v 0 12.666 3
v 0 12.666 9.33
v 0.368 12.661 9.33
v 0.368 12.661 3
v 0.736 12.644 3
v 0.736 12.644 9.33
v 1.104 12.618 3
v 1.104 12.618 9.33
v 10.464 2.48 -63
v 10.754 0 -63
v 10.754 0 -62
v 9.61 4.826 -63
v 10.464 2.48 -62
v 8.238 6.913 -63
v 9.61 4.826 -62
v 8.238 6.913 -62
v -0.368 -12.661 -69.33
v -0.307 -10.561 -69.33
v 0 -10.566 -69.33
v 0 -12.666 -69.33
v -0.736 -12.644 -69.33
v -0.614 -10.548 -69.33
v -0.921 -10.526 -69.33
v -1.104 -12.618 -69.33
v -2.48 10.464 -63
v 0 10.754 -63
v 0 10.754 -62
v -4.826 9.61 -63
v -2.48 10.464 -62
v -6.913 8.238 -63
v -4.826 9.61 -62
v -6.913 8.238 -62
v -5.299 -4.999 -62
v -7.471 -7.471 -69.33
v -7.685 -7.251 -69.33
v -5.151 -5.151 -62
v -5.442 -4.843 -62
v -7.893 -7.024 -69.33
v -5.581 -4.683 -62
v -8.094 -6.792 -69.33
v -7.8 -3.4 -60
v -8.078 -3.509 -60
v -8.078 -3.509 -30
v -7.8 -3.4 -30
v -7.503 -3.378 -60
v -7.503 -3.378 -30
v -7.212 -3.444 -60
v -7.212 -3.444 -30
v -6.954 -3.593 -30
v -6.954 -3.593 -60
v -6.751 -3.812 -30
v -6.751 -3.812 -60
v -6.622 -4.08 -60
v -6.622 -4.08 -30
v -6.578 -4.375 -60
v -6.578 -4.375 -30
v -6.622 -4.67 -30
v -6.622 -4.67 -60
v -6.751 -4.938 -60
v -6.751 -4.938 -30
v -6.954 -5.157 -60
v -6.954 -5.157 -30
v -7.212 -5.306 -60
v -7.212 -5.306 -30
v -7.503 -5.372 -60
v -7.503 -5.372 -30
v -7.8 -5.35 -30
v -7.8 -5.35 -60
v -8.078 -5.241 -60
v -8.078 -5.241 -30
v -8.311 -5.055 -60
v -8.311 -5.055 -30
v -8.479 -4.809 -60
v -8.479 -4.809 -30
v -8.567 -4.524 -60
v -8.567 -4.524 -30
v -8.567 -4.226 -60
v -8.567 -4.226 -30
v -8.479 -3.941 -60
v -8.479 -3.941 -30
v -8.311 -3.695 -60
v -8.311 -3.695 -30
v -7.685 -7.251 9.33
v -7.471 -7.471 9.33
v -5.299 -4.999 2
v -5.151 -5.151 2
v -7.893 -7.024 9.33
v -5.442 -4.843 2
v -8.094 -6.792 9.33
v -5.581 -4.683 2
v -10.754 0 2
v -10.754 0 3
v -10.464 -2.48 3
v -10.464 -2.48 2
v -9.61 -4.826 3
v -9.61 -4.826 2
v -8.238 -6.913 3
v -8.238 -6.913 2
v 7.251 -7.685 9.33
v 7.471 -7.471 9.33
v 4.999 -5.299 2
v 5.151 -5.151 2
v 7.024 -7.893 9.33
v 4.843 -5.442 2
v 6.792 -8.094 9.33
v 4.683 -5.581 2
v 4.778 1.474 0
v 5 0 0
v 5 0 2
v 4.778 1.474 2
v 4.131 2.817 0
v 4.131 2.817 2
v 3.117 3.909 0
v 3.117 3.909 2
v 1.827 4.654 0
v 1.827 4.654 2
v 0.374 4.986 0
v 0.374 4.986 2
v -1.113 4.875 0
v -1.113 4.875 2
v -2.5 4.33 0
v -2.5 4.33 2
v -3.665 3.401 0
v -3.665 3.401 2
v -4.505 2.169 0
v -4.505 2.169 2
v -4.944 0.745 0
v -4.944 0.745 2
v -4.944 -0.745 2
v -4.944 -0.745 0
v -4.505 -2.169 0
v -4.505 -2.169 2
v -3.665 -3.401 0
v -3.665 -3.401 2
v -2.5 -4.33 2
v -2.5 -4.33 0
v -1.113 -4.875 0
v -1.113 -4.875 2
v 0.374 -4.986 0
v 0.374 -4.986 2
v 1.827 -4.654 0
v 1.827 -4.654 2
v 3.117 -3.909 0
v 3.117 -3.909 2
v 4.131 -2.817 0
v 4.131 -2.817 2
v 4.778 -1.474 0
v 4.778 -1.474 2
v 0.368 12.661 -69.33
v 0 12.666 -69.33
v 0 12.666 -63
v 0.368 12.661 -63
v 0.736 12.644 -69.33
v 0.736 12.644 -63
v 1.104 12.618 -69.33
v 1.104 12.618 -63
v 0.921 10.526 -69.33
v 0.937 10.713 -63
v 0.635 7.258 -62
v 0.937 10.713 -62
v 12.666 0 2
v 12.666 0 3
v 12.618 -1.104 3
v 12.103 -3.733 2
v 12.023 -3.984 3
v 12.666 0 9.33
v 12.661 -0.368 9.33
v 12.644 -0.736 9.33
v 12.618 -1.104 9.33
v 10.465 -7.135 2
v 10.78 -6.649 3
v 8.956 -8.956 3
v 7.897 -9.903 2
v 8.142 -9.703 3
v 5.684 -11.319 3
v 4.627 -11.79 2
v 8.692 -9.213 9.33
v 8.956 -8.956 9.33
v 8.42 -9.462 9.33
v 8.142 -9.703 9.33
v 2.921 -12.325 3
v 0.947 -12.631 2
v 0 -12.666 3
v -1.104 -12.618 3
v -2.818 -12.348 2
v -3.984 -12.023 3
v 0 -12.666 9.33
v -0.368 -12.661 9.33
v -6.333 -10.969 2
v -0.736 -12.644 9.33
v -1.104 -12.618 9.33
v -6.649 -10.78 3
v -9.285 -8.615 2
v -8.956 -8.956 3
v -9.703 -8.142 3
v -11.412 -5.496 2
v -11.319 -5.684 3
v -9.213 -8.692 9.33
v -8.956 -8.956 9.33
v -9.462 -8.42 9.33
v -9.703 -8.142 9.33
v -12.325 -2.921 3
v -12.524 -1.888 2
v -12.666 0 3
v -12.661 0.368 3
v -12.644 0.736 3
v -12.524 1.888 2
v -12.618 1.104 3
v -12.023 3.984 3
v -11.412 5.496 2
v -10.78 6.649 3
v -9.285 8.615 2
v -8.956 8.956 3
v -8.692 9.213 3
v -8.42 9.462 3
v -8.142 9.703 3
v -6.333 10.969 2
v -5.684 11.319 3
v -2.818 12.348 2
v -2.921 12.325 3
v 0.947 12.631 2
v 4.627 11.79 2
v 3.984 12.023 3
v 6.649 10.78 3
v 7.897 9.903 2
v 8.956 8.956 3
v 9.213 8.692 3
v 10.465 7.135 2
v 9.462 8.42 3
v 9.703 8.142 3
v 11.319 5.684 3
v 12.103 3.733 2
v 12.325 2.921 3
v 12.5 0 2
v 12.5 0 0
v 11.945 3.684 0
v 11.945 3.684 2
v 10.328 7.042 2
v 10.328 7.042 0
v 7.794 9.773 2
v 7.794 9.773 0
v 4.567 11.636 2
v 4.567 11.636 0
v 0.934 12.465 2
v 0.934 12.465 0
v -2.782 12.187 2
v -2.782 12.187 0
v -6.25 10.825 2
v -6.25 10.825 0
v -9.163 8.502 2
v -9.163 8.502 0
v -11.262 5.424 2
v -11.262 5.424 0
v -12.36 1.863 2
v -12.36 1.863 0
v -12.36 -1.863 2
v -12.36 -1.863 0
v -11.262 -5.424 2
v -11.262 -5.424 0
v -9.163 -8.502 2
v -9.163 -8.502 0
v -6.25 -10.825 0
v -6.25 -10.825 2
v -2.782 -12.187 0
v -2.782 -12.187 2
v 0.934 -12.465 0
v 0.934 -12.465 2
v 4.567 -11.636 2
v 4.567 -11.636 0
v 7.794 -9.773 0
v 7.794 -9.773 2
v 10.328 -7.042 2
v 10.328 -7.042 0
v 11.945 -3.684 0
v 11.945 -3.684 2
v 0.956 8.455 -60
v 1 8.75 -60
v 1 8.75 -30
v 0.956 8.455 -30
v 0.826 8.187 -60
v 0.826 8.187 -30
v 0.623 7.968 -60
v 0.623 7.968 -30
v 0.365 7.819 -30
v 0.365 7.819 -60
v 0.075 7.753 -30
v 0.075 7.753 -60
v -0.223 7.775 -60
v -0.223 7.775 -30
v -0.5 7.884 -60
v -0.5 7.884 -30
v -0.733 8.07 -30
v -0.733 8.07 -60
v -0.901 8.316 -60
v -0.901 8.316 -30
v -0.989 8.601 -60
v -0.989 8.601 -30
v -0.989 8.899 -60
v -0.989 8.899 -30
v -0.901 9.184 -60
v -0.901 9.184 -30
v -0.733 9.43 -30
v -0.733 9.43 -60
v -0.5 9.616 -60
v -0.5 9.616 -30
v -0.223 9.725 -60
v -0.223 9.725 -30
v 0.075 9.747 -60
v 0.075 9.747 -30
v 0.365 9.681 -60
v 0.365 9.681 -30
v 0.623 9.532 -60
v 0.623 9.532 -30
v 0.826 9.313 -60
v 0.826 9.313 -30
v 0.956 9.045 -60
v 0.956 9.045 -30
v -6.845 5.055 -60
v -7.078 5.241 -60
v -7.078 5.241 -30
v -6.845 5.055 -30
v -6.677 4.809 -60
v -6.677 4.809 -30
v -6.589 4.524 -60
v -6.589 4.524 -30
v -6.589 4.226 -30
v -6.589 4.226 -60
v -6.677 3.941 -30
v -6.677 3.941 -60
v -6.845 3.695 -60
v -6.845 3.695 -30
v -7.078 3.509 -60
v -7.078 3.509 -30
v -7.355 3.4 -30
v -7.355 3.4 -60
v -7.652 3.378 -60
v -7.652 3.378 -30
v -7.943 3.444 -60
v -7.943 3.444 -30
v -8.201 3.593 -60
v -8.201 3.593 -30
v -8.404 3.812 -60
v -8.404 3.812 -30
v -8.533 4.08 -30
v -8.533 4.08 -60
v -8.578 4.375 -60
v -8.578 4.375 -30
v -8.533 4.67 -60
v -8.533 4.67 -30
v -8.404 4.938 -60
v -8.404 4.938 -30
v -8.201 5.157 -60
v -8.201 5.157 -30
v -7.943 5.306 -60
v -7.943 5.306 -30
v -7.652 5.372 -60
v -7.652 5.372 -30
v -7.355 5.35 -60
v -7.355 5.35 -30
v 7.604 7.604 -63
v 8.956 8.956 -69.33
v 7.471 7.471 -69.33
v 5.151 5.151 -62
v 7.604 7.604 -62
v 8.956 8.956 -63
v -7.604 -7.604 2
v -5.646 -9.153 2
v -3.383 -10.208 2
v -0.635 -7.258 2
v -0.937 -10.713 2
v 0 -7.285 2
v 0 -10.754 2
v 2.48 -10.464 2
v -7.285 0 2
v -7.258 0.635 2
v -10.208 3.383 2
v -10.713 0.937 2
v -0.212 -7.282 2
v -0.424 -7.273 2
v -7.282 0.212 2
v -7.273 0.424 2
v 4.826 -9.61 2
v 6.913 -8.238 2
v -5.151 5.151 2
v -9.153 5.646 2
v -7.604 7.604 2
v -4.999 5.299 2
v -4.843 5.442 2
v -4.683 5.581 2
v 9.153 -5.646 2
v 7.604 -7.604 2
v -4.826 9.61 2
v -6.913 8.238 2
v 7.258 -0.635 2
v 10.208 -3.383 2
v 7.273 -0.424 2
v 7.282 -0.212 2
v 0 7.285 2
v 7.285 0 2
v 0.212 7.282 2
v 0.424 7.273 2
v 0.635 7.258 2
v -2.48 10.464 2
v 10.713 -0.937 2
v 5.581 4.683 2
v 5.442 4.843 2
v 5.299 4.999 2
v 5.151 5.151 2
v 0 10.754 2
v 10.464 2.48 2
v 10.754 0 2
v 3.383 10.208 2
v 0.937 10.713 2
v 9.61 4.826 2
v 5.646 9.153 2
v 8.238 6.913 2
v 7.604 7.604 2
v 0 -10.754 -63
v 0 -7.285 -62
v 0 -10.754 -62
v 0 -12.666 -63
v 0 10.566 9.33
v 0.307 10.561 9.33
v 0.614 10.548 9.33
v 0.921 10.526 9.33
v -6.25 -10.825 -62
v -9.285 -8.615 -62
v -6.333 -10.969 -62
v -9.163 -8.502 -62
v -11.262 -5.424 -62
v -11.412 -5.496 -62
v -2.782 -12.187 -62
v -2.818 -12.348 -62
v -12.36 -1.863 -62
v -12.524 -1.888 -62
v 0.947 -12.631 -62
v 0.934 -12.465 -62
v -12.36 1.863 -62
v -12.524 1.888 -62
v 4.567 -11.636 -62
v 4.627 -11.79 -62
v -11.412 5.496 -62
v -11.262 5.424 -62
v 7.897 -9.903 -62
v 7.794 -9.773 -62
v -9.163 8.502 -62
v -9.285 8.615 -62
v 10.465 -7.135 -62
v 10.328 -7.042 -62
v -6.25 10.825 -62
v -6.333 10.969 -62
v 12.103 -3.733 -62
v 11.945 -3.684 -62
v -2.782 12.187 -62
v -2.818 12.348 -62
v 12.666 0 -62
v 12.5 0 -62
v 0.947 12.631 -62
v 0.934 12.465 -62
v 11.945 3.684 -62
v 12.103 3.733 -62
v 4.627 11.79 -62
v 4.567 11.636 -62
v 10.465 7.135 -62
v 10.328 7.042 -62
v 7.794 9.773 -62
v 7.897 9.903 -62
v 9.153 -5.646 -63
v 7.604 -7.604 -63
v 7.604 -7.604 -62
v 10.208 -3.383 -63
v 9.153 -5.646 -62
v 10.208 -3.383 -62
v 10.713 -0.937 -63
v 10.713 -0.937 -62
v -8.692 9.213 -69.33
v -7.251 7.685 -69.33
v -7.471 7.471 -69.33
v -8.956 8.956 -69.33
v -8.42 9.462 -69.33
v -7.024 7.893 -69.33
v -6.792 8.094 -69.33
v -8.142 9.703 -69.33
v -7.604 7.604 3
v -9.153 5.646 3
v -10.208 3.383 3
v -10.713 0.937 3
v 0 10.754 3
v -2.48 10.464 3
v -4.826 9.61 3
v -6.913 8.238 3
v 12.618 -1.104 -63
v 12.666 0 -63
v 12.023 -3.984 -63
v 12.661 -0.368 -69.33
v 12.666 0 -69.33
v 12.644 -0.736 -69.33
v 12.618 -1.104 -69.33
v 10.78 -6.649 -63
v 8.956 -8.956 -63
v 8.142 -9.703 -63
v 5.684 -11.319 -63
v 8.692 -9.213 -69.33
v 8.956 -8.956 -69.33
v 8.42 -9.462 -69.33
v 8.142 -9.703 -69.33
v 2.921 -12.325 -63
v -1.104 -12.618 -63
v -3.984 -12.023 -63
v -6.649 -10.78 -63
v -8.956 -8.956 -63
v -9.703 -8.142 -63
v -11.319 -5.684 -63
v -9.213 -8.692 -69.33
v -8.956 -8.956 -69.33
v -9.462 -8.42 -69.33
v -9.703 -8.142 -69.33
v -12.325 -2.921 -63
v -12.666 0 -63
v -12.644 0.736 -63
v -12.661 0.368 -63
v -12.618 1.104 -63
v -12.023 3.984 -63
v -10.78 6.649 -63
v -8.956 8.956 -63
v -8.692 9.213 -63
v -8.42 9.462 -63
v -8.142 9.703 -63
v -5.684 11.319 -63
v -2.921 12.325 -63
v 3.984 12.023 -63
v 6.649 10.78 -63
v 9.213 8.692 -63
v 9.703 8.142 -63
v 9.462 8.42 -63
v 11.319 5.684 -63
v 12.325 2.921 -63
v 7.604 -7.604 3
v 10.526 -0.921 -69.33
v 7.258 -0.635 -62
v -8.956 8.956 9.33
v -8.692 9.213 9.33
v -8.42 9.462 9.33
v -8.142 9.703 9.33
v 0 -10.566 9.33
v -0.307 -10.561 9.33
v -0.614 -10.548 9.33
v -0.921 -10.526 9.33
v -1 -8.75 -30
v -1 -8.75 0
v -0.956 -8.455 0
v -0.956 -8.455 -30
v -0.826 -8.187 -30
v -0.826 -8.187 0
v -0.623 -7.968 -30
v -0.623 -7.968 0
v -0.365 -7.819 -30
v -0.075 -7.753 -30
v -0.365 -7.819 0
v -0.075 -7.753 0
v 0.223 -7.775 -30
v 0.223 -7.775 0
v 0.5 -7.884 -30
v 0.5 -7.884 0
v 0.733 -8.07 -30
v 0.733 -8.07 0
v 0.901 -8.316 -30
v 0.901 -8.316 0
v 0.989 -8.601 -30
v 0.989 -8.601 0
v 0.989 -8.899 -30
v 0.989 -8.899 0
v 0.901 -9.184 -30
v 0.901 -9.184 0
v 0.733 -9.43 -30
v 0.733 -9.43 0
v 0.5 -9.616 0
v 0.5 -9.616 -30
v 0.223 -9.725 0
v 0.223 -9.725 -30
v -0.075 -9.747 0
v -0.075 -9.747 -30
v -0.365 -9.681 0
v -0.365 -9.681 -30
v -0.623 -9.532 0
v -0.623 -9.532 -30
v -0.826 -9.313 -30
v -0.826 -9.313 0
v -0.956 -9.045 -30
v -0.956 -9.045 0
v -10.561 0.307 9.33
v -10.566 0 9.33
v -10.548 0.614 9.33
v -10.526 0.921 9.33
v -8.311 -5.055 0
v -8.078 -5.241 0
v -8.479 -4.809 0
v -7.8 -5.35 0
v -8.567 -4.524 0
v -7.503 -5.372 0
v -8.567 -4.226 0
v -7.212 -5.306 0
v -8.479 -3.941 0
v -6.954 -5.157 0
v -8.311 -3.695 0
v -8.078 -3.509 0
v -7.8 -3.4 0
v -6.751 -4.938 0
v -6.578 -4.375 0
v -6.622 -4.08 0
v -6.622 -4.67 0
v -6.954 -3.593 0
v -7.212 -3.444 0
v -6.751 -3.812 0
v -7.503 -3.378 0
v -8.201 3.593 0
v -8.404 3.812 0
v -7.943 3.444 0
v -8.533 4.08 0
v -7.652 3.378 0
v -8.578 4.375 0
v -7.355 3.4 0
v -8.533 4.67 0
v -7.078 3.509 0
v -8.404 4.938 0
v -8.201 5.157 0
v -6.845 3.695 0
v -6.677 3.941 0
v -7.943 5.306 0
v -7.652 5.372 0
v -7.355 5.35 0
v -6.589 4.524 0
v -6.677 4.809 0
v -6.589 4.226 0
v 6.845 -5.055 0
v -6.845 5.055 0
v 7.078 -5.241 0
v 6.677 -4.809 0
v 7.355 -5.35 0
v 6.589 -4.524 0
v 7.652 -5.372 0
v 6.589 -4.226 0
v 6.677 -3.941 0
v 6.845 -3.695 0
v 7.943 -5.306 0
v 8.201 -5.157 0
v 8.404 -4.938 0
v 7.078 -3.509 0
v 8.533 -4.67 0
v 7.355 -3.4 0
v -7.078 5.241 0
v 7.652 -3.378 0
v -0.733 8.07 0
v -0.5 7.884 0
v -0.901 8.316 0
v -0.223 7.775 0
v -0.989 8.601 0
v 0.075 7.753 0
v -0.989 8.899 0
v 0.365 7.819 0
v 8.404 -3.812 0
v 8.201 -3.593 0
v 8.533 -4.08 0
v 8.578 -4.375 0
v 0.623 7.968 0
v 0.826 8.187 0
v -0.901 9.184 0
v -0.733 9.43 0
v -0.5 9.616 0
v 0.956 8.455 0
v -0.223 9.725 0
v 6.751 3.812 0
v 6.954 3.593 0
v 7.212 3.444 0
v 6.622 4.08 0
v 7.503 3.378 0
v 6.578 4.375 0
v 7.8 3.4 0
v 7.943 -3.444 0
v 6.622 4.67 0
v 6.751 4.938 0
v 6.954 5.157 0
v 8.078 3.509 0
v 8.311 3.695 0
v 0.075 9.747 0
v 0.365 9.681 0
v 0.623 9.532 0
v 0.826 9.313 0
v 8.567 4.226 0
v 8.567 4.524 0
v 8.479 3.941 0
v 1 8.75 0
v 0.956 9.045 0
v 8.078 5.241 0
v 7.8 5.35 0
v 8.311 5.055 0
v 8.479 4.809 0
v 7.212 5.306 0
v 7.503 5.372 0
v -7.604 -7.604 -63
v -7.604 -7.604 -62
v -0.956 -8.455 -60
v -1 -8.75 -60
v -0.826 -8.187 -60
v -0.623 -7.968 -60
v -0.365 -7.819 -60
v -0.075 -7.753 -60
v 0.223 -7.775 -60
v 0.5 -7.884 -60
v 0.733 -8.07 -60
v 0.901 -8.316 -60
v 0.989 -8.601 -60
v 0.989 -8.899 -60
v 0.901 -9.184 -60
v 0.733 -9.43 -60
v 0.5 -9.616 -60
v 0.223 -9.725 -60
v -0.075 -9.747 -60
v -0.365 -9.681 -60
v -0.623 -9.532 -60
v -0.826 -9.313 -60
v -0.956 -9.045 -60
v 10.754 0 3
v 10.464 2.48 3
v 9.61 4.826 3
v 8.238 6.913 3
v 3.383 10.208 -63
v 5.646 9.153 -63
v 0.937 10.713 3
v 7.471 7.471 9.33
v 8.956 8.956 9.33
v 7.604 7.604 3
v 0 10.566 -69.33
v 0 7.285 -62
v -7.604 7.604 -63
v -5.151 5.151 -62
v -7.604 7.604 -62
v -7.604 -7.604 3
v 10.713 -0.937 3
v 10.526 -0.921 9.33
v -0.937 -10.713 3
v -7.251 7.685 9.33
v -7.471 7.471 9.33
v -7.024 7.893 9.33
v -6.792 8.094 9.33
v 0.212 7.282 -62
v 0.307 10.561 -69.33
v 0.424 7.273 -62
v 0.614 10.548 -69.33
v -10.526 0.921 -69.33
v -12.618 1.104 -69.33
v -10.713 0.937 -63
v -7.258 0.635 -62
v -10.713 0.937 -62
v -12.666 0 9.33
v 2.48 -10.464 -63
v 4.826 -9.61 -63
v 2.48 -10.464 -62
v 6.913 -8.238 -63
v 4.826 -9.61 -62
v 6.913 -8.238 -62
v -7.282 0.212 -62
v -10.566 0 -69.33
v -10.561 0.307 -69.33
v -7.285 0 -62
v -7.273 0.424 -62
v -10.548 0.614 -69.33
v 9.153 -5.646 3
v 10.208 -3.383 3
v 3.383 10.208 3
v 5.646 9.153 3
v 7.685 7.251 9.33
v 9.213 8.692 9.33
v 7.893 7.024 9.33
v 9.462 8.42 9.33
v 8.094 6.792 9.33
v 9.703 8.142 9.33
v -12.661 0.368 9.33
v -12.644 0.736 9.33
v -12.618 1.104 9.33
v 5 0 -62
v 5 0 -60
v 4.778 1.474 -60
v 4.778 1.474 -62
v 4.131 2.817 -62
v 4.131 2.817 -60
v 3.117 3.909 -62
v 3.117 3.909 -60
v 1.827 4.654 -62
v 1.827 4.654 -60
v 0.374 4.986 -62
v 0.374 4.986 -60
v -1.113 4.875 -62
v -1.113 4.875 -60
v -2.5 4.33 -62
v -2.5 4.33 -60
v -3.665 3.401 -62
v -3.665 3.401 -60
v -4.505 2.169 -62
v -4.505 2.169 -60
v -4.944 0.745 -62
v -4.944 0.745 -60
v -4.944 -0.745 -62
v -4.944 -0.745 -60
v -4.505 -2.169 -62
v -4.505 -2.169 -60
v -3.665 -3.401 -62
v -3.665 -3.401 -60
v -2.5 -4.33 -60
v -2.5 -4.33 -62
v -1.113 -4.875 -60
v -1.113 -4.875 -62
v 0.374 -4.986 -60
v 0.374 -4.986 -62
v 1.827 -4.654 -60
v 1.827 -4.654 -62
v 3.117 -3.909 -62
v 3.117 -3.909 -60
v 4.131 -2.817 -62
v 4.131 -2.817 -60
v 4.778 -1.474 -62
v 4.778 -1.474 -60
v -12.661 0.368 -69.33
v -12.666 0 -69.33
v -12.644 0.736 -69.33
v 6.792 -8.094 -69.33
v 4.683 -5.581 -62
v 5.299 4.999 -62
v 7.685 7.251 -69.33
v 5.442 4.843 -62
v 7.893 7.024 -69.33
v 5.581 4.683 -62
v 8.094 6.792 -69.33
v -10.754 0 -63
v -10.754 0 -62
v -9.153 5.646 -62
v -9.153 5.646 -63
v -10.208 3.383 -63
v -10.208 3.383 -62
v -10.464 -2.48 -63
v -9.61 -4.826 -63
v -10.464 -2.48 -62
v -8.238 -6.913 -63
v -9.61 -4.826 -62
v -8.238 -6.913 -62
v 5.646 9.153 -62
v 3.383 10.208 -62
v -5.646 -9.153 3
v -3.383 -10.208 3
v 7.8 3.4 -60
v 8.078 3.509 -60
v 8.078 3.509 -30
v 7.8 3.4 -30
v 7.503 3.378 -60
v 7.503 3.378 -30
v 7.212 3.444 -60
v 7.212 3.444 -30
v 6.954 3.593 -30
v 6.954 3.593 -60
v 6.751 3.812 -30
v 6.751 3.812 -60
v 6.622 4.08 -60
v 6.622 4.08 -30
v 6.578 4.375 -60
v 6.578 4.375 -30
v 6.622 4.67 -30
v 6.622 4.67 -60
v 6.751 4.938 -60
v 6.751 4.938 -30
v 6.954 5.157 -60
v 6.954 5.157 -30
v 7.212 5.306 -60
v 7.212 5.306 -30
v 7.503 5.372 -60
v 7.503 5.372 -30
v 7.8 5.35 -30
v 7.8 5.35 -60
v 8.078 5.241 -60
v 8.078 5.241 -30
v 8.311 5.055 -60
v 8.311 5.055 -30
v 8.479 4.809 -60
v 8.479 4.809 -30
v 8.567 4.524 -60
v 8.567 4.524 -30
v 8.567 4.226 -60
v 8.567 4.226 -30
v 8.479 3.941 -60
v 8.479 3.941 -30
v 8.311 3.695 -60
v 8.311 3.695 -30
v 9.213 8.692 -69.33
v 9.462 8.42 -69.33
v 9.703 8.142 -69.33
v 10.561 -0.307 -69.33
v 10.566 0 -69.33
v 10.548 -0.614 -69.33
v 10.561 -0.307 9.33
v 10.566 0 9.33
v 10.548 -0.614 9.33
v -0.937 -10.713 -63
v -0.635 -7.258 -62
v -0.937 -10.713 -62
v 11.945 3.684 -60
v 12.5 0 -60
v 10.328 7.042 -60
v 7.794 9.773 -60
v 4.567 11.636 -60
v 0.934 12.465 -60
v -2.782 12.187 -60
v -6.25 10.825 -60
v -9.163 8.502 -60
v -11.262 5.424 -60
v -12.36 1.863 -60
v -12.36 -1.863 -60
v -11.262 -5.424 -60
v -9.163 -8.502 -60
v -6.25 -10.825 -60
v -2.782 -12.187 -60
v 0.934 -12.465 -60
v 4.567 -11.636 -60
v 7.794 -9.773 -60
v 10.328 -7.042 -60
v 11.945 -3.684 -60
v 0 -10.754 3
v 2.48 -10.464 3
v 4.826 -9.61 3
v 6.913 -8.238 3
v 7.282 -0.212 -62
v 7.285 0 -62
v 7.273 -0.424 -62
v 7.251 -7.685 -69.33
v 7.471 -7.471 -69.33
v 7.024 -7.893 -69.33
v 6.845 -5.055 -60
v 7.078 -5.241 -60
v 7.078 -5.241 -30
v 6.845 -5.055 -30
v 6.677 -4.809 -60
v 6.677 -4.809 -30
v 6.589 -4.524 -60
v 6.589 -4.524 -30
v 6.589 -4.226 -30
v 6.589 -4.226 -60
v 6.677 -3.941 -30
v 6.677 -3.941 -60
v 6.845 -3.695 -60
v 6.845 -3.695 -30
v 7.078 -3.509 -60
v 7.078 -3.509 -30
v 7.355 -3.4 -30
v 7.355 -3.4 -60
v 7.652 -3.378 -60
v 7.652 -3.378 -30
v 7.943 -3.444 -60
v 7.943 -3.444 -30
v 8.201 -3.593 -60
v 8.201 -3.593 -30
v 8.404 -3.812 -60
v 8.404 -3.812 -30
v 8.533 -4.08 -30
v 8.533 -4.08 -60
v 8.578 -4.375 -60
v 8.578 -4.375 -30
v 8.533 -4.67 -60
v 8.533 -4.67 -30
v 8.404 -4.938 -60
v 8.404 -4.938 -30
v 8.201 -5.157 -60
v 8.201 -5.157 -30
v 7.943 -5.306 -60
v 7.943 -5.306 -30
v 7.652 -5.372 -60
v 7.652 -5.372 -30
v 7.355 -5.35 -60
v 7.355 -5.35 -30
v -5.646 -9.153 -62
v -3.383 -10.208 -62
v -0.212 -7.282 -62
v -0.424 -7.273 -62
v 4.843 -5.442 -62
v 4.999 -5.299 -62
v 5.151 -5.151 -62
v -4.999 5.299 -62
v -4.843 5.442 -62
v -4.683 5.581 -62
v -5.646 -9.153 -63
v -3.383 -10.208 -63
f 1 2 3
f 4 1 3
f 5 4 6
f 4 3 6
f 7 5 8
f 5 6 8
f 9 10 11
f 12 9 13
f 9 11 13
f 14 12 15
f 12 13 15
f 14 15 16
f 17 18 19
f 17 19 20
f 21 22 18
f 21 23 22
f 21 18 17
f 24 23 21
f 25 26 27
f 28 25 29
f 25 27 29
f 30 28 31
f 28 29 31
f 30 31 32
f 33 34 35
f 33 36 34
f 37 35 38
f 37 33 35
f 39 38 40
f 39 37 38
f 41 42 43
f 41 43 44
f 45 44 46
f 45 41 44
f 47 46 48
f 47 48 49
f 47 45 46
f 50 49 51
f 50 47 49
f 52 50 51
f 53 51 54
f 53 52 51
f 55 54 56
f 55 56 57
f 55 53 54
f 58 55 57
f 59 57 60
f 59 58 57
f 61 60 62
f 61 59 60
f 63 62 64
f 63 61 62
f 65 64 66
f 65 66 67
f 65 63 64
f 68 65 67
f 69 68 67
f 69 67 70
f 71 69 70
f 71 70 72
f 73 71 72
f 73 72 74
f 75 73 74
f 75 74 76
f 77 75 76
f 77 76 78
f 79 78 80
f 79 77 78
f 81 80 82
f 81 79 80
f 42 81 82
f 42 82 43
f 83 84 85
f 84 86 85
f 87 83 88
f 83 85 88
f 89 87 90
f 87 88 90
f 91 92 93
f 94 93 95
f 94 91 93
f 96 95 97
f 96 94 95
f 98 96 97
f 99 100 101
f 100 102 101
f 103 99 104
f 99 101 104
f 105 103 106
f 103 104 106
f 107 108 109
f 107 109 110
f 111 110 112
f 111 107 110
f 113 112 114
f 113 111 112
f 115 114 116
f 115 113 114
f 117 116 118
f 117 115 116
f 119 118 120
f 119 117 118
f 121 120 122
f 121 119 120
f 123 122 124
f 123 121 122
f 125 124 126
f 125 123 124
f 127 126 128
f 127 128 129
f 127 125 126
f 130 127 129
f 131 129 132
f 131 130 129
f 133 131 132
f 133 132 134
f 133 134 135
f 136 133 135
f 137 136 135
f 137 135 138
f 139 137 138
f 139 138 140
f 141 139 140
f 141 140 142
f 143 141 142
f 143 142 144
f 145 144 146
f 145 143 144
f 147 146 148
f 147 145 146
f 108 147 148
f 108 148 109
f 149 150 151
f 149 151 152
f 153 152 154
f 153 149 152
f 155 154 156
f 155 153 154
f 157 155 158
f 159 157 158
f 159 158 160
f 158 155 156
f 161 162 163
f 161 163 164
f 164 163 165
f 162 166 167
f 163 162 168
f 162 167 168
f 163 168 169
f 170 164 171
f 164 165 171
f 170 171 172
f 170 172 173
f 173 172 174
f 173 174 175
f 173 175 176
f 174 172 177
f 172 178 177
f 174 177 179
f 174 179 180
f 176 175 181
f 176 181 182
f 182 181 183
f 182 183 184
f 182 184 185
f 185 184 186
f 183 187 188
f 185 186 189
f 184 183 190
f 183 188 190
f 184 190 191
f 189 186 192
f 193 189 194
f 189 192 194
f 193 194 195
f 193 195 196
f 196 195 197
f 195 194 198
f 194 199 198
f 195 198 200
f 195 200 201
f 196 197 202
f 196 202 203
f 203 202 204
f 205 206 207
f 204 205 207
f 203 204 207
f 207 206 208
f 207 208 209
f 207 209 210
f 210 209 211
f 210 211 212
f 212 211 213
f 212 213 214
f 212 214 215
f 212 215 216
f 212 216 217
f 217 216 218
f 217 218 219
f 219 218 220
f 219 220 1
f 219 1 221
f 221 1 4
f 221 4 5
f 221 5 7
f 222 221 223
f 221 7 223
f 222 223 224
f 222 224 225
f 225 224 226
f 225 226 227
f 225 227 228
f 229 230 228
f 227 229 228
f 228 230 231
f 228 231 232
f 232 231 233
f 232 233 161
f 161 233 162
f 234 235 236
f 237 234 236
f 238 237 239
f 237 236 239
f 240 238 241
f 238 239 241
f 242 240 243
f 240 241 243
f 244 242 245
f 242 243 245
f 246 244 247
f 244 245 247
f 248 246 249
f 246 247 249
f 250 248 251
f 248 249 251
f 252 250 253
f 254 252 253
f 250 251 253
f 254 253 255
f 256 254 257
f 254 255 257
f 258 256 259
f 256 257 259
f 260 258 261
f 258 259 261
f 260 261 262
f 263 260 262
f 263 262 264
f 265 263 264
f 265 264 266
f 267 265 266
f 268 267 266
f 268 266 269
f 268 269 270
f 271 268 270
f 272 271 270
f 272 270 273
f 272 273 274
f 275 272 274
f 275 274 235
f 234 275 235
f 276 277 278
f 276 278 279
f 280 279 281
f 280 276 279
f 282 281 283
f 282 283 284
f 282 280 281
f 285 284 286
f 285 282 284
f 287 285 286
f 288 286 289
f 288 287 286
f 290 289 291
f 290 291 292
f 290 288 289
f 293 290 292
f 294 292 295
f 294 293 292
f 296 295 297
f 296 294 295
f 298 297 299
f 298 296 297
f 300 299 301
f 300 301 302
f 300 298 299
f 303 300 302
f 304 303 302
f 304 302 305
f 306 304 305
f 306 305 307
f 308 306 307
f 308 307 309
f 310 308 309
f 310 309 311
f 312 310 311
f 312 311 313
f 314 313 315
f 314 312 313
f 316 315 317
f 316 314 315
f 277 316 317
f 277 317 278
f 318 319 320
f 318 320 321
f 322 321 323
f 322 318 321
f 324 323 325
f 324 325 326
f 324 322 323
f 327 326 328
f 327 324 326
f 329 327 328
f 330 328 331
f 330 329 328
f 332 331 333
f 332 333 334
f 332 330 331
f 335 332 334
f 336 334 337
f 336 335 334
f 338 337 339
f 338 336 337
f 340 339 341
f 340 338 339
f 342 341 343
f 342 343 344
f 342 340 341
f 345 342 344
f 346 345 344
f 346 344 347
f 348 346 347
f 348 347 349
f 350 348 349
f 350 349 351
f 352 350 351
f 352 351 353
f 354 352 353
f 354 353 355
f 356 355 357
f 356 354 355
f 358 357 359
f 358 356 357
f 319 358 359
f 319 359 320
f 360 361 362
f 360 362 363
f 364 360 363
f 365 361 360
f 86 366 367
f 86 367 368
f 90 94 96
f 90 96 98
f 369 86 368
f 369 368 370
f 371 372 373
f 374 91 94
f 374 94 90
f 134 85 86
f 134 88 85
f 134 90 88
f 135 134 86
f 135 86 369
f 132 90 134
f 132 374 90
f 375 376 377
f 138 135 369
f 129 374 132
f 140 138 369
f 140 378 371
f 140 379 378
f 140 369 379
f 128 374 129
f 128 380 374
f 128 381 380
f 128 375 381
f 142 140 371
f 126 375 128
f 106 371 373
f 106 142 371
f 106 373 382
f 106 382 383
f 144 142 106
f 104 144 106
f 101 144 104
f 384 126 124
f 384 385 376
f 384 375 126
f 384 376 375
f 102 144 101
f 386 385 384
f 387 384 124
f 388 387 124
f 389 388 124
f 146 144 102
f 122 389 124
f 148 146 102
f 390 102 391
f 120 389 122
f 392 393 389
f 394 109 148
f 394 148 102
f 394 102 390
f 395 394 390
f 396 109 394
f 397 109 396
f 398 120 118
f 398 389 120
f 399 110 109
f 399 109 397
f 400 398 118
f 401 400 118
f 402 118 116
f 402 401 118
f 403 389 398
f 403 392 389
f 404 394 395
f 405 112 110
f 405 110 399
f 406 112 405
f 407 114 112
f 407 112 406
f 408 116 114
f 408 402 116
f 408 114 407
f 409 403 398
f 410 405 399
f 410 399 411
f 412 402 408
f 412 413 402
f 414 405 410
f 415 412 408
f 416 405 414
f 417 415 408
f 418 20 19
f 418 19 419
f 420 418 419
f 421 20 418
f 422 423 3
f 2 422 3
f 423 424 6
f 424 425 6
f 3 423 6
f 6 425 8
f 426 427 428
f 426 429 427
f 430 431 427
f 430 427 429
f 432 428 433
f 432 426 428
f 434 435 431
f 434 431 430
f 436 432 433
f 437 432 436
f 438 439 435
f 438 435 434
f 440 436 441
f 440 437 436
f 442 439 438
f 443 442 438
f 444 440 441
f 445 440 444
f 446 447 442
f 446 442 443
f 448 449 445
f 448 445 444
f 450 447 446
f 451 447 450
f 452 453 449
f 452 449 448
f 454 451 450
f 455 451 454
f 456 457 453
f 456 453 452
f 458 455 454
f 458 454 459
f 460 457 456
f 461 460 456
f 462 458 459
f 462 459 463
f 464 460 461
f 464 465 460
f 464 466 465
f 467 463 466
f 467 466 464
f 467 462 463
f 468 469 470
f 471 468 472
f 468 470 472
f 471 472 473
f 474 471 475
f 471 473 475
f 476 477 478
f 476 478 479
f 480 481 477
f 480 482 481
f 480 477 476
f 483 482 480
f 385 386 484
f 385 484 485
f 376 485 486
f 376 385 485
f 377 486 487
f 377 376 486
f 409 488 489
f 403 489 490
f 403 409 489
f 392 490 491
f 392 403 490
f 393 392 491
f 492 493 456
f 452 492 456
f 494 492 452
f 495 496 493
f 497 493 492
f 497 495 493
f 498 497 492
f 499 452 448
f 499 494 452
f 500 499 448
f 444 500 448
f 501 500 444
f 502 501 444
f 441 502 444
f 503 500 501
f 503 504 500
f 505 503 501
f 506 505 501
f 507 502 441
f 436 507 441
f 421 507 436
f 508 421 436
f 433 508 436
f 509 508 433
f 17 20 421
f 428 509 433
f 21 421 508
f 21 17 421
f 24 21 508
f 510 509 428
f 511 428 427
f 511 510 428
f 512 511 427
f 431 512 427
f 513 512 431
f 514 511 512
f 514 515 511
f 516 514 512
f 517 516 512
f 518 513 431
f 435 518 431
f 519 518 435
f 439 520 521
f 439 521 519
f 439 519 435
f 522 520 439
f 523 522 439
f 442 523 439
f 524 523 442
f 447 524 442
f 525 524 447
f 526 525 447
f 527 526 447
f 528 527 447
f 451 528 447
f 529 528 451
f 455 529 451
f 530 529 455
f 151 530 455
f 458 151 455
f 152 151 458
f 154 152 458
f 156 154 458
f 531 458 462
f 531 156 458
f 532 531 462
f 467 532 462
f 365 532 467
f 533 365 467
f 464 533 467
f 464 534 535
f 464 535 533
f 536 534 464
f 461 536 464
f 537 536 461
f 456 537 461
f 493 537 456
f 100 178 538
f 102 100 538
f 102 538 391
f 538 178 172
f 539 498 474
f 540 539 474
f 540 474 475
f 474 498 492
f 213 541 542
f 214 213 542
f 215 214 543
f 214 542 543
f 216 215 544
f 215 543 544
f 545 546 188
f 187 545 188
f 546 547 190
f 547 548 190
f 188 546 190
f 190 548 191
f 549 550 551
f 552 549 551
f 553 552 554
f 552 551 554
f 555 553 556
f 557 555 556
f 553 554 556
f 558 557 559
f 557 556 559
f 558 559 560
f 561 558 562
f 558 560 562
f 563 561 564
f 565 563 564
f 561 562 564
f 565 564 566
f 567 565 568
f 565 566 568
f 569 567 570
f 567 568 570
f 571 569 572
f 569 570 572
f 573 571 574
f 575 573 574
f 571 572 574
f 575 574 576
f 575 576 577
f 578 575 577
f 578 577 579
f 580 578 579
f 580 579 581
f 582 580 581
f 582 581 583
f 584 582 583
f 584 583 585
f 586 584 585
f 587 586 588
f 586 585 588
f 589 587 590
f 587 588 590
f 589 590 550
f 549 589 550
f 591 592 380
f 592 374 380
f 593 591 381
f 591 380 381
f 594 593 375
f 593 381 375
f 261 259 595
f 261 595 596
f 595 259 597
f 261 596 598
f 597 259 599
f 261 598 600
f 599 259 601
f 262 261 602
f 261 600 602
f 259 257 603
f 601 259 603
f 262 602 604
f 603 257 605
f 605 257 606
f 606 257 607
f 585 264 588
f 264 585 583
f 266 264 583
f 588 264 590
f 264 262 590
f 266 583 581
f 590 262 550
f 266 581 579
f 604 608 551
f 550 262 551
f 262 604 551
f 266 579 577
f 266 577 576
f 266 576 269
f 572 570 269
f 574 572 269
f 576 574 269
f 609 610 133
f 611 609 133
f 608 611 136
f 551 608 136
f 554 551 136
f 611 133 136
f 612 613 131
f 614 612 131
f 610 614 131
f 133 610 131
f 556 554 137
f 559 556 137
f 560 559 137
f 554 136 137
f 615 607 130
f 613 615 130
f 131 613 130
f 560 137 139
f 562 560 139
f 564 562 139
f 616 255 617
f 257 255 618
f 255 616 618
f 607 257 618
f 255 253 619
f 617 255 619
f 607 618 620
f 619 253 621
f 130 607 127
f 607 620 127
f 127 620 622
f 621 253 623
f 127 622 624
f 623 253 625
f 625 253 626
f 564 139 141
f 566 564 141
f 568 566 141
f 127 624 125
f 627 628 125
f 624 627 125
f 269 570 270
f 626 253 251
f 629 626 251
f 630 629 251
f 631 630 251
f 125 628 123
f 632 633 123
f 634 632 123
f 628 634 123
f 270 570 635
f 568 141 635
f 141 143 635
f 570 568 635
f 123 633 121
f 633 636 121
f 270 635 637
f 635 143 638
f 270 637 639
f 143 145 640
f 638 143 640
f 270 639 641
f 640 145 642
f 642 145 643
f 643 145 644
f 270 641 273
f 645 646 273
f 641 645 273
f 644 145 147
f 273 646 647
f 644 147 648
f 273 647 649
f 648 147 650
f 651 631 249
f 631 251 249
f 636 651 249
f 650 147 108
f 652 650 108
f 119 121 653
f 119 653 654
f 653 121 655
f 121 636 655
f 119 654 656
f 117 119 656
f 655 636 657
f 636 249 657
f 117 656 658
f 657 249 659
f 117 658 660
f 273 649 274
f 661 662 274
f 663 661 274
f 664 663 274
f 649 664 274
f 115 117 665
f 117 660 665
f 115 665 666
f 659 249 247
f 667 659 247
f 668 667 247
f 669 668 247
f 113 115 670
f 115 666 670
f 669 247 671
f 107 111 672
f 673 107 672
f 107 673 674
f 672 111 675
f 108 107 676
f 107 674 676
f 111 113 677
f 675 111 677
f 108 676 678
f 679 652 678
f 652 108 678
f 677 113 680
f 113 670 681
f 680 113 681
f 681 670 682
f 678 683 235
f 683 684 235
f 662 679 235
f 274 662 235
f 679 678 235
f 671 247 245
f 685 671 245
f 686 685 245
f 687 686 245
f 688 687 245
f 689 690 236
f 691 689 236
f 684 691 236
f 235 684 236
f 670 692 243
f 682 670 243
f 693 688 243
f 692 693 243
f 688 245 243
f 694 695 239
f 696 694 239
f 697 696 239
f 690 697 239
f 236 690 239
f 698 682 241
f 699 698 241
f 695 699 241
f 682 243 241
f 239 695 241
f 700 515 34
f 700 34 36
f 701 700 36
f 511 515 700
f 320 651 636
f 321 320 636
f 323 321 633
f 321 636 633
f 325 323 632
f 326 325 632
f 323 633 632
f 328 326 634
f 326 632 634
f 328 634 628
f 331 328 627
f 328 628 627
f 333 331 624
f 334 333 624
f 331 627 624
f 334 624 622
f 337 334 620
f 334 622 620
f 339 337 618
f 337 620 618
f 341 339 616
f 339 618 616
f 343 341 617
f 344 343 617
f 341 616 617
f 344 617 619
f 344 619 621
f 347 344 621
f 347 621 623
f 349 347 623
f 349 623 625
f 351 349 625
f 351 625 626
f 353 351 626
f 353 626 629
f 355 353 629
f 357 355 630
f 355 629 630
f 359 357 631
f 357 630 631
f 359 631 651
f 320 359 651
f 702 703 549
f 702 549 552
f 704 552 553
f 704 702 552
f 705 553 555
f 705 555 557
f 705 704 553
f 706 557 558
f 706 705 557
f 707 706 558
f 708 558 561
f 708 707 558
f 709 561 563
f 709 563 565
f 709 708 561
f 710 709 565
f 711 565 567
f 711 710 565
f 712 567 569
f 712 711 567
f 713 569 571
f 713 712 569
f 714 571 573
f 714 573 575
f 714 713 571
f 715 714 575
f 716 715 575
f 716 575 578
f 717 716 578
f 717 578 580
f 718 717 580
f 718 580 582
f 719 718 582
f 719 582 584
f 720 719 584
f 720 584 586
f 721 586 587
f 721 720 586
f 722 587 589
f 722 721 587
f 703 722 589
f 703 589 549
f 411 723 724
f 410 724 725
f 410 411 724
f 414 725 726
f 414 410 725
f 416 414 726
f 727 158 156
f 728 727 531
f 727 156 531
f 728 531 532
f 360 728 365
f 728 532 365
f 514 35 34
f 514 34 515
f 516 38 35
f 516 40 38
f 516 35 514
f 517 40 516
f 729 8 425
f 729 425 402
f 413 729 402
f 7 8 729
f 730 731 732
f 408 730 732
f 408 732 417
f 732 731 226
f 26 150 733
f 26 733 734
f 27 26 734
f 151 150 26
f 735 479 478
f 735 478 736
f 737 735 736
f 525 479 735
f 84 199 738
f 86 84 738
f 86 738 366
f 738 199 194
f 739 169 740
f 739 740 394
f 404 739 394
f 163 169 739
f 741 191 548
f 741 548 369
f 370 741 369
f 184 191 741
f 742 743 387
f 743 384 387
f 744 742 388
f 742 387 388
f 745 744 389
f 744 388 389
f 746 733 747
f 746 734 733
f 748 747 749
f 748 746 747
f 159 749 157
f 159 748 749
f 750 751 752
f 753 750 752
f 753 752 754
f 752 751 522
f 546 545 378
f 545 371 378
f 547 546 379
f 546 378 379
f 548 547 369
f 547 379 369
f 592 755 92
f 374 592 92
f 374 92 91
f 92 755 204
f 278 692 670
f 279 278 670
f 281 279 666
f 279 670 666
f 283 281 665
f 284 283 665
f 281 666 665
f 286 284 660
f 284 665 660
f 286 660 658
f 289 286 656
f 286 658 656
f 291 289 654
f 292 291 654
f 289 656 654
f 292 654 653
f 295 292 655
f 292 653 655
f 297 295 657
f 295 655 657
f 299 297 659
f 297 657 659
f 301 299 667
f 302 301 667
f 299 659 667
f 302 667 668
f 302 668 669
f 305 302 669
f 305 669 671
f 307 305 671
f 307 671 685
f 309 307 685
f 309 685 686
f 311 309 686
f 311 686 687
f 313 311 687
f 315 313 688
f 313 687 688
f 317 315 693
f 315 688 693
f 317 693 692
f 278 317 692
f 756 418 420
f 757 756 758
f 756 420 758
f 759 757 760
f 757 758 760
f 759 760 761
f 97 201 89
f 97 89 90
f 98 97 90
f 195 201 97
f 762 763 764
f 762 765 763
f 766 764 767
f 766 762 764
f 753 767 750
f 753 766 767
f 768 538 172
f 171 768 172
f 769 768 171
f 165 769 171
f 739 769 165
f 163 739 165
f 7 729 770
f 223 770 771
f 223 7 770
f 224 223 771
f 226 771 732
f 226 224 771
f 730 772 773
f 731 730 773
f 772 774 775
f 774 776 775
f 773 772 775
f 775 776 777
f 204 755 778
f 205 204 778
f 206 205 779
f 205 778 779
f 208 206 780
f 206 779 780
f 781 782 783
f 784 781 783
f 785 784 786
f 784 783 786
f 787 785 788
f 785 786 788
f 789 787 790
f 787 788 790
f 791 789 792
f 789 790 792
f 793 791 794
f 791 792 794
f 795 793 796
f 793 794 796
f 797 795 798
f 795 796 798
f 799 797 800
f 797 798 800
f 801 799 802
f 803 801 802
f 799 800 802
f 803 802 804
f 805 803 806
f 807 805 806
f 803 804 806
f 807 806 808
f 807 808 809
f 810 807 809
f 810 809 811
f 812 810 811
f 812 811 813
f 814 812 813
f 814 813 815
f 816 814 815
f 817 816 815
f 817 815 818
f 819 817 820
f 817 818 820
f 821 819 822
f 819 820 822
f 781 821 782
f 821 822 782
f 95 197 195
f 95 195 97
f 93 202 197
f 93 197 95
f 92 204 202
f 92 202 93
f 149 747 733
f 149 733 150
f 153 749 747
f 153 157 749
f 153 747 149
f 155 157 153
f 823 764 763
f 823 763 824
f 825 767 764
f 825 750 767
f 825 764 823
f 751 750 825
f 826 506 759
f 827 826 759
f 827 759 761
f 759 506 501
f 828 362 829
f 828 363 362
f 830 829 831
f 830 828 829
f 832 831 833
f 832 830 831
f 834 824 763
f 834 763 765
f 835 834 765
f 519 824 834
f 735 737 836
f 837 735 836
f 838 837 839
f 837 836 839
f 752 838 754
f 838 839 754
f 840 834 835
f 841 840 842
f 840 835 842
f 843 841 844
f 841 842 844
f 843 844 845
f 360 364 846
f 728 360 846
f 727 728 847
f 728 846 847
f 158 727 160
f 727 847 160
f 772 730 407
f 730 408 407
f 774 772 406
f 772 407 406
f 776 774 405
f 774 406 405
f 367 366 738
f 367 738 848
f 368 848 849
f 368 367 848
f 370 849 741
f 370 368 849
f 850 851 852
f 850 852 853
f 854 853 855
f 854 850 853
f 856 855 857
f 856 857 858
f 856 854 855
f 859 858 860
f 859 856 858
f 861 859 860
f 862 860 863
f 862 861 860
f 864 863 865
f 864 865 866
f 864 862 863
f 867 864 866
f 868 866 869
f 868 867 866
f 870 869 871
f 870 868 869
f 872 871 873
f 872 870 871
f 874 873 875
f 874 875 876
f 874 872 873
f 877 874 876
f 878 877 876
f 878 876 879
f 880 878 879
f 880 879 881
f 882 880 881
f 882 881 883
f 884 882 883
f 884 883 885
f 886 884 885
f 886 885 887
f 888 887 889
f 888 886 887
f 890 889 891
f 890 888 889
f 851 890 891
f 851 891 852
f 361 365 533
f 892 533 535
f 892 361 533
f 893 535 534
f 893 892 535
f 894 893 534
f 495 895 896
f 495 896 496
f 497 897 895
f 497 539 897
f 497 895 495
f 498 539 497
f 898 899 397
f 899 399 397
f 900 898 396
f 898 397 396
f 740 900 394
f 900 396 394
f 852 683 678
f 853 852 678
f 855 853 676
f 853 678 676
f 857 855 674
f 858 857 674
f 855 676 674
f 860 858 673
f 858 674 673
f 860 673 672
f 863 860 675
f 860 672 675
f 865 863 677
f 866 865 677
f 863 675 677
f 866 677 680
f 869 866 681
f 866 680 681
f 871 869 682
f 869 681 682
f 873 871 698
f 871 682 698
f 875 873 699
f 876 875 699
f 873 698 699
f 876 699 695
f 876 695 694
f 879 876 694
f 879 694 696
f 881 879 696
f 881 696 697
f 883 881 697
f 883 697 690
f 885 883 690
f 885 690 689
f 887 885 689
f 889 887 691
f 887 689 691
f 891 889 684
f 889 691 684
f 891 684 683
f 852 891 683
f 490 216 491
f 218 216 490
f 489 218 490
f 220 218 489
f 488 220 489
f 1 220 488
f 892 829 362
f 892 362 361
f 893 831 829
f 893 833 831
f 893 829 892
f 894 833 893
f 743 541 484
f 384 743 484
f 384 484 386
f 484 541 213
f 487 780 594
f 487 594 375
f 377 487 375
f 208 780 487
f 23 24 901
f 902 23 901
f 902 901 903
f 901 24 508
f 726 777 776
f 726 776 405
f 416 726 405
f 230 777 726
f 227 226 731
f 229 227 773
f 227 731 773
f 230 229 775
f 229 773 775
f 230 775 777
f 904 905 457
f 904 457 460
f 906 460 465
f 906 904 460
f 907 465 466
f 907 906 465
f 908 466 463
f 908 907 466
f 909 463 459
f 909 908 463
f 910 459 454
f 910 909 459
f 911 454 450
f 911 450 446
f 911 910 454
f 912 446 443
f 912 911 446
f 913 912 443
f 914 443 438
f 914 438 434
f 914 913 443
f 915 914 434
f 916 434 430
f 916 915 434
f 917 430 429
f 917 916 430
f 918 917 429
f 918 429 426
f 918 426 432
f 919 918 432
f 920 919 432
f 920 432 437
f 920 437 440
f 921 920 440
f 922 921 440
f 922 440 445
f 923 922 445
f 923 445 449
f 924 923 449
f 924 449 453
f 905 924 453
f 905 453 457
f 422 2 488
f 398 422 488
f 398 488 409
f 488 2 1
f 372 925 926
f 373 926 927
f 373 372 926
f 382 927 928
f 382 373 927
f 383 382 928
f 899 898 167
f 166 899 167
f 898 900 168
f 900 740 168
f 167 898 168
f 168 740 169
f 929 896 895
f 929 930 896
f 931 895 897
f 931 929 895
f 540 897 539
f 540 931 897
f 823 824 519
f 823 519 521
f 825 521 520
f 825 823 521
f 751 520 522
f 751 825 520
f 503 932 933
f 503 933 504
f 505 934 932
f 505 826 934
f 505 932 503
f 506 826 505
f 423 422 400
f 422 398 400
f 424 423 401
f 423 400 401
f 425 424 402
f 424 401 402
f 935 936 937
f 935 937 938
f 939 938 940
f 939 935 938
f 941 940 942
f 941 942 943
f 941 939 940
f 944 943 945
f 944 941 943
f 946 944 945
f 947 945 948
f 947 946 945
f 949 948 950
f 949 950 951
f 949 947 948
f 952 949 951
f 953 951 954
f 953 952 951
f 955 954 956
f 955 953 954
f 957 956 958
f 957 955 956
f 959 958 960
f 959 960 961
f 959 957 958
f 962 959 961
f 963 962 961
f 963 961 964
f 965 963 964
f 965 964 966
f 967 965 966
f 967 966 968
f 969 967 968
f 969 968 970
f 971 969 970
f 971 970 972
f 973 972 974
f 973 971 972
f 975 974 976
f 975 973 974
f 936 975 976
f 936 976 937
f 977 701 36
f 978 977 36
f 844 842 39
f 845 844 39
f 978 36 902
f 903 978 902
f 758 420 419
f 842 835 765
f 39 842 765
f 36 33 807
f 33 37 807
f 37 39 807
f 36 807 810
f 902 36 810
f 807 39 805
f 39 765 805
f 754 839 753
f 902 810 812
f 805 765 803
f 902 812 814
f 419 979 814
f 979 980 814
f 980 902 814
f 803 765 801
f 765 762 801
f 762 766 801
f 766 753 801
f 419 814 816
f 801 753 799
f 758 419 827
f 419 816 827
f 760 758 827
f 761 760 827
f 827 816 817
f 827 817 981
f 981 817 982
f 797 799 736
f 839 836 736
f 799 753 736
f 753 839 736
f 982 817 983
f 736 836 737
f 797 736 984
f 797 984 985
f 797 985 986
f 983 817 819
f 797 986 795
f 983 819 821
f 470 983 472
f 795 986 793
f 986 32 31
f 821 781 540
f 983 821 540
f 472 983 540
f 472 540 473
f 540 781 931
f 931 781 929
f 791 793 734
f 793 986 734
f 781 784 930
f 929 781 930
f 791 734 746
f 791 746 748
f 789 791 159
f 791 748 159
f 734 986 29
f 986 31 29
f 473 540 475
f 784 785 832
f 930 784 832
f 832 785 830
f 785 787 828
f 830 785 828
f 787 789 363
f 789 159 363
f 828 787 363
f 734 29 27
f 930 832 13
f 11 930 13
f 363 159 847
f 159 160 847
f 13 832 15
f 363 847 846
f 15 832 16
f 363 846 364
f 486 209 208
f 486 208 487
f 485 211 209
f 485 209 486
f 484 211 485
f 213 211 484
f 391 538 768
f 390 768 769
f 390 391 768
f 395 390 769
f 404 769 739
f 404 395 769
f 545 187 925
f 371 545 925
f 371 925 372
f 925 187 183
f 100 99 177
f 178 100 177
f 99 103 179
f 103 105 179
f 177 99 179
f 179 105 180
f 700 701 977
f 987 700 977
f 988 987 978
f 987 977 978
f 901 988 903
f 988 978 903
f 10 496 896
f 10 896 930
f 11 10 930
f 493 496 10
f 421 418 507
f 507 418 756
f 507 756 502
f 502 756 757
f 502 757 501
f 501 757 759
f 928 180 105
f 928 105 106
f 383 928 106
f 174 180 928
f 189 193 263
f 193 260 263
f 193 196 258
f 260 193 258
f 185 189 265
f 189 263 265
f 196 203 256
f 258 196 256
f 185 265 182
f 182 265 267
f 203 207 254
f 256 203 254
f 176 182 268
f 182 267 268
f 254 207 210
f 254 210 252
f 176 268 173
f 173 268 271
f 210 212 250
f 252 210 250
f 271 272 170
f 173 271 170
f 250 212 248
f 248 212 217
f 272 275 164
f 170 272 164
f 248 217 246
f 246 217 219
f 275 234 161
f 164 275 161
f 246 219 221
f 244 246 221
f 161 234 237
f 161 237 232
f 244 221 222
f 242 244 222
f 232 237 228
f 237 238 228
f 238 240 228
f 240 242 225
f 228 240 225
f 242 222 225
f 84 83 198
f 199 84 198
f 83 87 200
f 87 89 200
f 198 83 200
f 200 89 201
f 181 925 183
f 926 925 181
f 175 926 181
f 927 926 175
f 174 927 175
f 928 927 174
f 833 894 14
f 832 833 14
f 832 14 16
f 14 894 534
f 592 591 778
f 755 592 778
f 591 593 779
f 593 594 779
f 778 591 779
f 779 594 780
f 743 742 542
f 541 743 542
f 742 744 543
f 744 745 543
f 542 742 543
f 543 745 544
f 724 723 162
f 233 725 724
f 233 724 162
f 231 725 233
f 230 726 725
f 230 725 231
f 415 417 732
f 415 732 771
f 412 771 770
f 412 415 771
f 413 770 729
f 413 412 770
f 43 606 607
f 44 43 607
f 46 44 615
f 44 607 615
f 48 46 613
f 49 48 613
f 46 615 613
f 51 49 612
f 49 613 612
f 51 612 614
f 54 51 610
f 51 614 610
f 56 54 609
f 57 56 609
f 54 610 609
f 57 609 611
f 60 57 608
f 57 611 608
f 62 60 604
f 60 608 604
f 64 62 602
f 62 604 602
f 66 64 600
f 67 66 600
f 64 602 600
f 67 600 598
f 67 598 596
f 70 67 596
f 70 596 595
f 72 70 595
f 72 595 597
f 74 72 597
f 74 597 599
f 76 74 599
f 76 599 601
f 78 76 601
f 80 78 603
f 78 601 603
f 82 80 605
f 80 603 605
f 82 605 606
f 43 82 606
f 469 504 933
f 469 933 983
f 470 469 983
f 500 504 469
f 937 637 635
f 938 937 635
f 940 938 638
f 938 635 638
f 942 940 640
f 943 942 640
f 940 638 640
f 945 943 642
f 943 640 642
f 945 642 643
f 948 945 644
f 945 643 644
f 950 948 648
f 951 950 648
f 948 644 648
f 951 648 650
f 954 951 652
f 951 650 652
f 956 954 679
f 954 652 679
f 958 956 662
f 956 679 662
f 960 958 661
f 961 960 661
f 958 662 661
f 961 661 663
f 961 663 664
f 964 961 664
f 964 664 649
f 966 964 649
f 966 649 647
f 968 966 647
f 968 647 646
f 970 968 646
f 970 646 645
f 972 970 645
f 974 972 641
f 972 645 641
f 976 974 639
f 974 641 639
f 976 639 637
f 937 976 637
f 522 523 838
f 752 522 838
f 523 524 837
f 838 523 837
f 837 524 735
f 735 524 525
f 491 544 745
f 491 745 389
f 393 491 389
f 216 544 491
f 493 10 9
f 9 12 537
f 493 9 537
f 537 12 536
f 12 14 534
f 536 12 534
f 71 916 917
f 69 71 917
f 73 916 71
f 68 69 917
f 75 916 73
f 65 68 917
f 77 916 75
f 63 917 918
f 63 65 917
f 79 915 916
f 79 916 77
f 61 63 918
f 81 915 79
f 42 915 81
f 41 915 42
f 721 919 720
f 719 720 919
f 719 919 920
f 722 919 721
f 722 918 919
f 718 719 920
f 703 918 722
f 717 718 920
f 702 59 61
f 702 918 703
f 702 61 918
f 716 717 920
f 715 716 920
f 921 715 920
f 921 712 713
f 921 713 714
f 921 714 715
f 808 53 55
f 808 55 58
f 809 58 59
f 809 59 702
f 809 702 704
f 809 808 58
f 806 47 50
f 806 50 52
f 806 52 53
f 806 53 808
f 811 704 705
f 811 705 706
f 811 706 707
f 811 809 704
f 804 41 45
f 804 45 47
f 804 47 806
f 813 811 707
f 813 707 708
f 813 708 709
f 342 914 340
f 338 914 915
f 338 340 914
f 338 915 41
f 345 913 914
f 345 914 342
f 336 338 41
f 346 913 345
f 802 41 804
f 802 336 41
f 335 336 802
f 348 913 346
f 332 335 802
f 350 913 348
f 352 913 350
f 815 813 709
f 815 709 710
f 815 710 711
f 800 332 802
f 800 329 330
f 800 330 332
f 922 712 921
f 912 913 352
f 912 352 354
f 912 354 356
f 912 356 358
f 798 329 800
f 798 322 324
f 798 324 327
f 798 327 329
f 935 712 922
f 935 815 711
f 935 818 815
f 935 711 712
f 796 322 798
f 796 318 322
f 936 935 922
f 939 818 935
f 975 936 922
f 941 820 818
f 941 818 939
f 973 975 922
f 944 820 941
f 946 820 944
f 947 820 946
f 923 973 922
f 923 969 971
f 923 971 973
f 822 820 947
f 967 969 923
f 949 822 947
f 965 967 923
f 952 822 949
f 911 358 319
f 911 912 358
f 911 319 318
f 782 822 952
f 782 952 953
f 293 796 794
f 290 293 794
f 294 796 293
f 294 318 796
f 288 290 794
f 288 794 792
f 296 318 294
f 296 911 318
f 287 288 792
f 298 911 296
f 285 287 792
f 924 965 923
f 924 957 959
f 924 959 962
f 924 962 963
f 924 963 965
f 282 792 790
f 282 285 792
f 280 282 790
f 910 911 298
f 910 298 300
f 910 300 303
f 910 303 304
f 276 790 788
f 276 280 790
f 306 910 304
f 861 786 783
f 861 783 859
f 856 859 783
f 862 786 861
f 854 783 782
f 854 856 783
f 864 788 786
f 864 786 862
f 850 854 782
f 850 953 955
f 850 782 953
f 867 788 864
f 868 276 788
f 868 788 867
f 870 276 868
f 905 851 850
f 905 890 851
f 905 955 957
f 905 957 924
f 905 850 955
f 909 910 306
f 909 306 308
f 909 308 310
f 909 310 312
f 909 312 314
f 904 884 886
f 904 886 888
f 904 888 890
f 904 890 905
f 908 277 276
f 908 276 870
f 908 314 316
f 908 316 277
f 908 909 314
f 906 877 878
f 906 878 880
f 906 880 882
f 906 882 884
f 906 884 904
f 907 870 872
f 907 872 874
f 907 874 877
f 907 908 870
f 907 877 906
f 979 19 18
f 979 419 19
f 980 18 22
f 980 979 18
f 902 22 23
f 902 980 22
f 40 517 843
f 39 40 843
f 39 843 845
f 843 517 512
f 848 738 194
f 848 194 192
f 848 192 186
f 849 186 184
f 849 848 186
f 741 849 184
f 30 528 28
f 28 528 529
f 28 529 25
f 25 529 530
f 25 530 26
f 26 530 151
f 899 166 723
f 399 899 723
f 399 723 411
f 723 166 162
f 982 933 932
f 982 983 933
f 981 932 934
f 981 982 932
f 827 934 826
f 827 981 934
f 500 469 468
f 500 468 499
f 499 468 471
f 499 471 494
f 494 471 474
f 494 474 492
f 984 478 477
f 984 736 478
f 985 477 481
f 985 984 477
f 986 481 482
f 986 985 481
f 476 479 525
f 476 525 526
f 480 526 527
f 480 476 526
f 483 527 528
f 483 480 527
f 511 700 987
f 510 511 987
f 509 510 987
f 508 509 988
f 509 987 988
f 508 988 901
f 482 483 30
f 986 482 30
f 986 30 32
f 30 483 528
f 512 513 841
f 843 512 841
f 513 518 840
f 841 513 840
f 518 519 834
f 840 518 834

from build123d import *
from build123d.topology import SkipClean

# Parameters (mm, degrees)
SKETCH1_R           = 12.5
SKETCH1_R_2         = 5
BOSS_EXTRUDE1_DEPTH = 2
SKETCH3_R           = 12.665926605
SKETCH3_R_2         = 10.754079628
BOSS_EXTRUDE4_DEPTH = 1
REVOLVE1_ANGLE      = 5
CIRPATTERN1_COUNT   = 8
SKETCH5_R           = 1
BOSS_EXTRUDE5_DEPTH = 30
CIRPATTERN2_COUNT   = 6


with BuildPart() as part:
    # Sketch1 → Boss-Extrude1 (new body)
    with BuildSketch(Plane.XY):
        Circle(SKETCH1_R)
        Circle(SKETCH1_R_2, mode=Mode.SUBTRACT)
    extrude(amount=BOSS_EXTRUDE1_DEPTH)

    # Sketch3 → Boss-Extrude4 (add)
    with BuildSketch(Plane.XY.offset(2)):
        Circle(SKETCH3_R)
        Circle(SKETCH3_R_2, mode=Mode.SUBTRACT)
    extrude(amount=BOSS_EXTRUDE4_DEPTH)

    # Sketch4 → Revolve1 (revolve)
    with SkipClean():  # the faces are left unmerged after this step: merging them gives an invalid solid
        with BuildSketch(Plane(origin=(0, 0, 0), x_dir=(0, 0, -1), z_dir=(1, 0, 0))):
            Polygon((-9.330054786, 12.665926605), (-9.330054786, 10.565877972), (-2, 7.285294012), (-2, 12.665926605), align=None)
        revolve1 = revolve(axis=Axis((0, 0, 9.312529427), (0, 0, -1)), revolution_arc=REVOLVE1_ANGLE)
    add(part.part.scale(1), mode=Mode.REPLACE)  # the faces are merged on a copy

    # CirPattern1: Revolve1 ×8 about axis
    cirpattern1_axis = Axis((0, 0, 9.312529427), (0, 0, -1))
    for i in range(1, CIRPATTERN1_COUNT):
        add(revolve1.rotate(cirpattern1_axis, i * 360 / CIRPATTERN1_COUNT))

    # Sketch5 → Boss-Extrude5 (add)
    with BuildSketch(Plane(origin=(0, 0, 0), x_dir=(-1, 0, 0), z_dir=(0, 0, -1))):
        with Locations((0, 8.75)):
            Circle(SKETCH5_R)
    boss_extrude5 = extrude(amount=BOSS_EXTRUDE5_DEPTH)

    # CirPattern2: Boss-Extrude5 ×6 about axis
    cirpattern2_axis = Axis((0, 0, 9.312529427), (0, 0, -1))
    for i in range(1, CIRPATTERN2_COUNT):
        add(boss_extrude5.rotate(cirpattern2_axis, i * 360 / CIRPATTERN2_COUNT))

    # Mirror4: part across plane


with BuildPart() as part_1:
    add(part.part)
    add(part.part.mirror(Plane.XY.offset(-30)))


solid = part_1.part
